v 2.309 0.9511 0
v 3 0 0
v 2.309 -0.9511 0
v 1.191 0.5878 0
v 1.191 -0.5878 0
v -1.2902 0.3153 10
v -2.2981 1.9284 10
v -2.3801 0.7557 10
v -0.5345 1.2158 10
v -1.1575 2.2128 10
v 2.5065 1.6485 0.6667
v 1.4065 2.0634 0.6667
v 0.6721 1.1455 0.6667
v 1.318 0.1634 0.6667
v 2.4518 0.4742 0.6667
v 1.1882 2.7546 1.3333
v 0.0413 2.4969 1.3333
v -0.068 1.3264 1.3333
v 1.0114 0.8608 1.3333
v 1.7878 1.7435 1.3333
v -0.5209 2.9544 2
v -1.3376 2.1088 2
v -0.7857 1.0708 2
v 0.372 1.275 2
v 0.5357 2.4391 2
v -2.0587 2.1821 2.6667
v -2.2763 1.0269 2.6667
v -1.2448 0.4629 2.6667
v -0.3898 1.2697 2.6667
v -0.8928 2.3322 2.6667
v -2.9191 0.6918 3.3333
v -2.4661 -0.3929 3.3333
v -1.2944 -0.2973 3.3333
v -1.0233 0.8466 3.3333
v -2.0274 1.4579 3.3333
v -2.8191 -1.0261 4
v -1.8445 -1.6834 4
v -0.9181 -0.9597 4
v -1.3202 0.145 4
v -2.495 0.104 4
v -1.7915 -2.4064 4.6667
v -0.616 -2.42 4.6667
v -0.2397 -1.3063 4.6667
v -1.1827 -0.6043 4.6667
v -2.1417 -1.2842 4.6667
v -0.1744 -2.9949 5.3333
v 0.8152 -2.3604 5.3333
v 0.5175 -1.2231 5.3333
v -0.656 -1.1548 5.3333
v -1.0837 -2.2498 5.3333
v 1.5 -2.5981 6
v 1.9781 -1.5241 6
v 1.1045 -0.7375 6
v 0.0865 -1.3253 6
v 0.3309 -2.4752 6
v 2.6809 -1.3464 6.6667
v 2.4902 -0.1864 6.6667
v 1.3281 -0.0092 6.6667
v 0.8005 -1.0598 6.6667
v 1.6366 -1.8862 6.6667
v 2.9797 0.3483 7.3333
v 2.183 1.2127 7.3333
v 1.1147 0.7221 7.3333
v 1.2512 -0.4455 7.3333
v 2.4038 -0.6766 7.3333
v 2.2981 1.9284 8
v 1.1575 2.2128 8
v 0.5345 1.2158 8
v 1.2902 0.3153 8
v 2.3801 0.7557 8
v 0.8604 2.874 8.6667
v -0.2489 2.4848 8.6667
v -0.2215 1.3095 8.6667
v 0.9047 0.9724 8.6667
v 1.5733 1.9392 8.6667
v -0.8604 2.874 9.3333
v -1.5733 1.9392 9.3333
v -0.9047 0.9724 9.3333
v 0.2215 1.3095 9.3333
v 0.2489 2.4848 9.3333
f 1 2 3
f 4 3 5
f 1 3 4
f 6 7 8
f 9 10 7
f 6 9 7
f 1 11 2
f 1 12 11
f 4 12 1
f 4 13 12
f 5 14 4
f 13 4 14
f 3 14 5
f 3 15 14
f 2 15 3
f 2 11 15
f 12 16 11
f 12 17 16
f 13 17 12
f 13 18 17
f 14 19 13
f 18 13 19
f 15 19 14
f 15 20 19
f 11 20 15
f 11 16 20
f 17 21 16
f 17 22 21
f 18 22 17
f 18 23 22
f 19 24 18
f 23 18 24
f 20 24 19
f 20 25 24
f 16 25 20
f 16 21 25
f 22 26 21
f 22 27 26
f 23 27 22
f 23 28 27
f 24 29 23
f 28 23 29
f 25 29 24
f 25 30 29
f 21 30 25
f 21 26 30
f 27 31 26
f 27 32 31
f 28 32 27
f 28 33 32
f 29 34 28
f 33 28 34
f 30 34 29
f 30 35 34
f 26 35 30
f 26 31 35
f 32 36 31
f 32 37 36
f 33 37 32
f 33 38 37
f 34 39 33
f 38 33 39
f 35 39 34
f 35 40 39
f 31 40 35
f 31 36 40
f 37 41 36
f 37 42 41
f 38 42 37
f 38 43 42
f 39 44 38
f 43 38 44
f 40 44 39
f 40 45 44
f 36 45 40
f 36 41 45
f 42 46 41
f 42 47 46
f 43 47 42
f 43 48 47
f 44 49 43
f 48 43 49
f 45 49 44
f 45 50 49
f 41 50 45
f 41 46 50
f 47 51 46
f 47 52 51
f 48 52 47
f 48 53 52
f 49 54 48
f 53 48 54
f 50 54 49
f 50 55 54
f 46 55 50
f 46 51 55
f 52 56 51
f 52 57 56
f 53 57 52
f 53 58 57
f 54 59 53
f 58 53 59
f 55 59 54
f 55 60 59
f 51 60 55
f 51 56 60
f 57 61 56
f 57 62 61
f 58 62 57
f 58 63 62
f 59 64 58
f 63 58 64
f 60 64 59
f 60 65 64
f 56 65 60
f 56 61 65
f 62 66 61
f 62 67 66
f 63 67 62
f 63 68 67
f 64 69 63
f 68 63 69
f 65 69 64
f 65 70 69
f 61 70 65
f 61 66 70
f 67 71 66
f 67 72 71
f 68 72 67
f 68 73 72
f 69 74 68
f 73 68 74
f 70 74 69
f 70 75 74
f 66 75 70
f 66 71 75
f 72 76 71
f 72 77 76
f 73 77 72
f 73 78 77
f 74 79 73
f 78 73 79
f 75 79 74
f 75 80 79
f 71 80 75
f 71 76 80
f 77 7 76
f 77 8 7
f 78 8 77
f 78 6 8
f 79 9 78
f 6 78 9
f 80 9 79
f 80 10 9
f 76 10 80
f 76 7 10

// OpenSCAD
linear_extrude(height = 10, center = false, convexity = 10, twist = -500)
translate([2, 0, 0])
circle(r = 1);
